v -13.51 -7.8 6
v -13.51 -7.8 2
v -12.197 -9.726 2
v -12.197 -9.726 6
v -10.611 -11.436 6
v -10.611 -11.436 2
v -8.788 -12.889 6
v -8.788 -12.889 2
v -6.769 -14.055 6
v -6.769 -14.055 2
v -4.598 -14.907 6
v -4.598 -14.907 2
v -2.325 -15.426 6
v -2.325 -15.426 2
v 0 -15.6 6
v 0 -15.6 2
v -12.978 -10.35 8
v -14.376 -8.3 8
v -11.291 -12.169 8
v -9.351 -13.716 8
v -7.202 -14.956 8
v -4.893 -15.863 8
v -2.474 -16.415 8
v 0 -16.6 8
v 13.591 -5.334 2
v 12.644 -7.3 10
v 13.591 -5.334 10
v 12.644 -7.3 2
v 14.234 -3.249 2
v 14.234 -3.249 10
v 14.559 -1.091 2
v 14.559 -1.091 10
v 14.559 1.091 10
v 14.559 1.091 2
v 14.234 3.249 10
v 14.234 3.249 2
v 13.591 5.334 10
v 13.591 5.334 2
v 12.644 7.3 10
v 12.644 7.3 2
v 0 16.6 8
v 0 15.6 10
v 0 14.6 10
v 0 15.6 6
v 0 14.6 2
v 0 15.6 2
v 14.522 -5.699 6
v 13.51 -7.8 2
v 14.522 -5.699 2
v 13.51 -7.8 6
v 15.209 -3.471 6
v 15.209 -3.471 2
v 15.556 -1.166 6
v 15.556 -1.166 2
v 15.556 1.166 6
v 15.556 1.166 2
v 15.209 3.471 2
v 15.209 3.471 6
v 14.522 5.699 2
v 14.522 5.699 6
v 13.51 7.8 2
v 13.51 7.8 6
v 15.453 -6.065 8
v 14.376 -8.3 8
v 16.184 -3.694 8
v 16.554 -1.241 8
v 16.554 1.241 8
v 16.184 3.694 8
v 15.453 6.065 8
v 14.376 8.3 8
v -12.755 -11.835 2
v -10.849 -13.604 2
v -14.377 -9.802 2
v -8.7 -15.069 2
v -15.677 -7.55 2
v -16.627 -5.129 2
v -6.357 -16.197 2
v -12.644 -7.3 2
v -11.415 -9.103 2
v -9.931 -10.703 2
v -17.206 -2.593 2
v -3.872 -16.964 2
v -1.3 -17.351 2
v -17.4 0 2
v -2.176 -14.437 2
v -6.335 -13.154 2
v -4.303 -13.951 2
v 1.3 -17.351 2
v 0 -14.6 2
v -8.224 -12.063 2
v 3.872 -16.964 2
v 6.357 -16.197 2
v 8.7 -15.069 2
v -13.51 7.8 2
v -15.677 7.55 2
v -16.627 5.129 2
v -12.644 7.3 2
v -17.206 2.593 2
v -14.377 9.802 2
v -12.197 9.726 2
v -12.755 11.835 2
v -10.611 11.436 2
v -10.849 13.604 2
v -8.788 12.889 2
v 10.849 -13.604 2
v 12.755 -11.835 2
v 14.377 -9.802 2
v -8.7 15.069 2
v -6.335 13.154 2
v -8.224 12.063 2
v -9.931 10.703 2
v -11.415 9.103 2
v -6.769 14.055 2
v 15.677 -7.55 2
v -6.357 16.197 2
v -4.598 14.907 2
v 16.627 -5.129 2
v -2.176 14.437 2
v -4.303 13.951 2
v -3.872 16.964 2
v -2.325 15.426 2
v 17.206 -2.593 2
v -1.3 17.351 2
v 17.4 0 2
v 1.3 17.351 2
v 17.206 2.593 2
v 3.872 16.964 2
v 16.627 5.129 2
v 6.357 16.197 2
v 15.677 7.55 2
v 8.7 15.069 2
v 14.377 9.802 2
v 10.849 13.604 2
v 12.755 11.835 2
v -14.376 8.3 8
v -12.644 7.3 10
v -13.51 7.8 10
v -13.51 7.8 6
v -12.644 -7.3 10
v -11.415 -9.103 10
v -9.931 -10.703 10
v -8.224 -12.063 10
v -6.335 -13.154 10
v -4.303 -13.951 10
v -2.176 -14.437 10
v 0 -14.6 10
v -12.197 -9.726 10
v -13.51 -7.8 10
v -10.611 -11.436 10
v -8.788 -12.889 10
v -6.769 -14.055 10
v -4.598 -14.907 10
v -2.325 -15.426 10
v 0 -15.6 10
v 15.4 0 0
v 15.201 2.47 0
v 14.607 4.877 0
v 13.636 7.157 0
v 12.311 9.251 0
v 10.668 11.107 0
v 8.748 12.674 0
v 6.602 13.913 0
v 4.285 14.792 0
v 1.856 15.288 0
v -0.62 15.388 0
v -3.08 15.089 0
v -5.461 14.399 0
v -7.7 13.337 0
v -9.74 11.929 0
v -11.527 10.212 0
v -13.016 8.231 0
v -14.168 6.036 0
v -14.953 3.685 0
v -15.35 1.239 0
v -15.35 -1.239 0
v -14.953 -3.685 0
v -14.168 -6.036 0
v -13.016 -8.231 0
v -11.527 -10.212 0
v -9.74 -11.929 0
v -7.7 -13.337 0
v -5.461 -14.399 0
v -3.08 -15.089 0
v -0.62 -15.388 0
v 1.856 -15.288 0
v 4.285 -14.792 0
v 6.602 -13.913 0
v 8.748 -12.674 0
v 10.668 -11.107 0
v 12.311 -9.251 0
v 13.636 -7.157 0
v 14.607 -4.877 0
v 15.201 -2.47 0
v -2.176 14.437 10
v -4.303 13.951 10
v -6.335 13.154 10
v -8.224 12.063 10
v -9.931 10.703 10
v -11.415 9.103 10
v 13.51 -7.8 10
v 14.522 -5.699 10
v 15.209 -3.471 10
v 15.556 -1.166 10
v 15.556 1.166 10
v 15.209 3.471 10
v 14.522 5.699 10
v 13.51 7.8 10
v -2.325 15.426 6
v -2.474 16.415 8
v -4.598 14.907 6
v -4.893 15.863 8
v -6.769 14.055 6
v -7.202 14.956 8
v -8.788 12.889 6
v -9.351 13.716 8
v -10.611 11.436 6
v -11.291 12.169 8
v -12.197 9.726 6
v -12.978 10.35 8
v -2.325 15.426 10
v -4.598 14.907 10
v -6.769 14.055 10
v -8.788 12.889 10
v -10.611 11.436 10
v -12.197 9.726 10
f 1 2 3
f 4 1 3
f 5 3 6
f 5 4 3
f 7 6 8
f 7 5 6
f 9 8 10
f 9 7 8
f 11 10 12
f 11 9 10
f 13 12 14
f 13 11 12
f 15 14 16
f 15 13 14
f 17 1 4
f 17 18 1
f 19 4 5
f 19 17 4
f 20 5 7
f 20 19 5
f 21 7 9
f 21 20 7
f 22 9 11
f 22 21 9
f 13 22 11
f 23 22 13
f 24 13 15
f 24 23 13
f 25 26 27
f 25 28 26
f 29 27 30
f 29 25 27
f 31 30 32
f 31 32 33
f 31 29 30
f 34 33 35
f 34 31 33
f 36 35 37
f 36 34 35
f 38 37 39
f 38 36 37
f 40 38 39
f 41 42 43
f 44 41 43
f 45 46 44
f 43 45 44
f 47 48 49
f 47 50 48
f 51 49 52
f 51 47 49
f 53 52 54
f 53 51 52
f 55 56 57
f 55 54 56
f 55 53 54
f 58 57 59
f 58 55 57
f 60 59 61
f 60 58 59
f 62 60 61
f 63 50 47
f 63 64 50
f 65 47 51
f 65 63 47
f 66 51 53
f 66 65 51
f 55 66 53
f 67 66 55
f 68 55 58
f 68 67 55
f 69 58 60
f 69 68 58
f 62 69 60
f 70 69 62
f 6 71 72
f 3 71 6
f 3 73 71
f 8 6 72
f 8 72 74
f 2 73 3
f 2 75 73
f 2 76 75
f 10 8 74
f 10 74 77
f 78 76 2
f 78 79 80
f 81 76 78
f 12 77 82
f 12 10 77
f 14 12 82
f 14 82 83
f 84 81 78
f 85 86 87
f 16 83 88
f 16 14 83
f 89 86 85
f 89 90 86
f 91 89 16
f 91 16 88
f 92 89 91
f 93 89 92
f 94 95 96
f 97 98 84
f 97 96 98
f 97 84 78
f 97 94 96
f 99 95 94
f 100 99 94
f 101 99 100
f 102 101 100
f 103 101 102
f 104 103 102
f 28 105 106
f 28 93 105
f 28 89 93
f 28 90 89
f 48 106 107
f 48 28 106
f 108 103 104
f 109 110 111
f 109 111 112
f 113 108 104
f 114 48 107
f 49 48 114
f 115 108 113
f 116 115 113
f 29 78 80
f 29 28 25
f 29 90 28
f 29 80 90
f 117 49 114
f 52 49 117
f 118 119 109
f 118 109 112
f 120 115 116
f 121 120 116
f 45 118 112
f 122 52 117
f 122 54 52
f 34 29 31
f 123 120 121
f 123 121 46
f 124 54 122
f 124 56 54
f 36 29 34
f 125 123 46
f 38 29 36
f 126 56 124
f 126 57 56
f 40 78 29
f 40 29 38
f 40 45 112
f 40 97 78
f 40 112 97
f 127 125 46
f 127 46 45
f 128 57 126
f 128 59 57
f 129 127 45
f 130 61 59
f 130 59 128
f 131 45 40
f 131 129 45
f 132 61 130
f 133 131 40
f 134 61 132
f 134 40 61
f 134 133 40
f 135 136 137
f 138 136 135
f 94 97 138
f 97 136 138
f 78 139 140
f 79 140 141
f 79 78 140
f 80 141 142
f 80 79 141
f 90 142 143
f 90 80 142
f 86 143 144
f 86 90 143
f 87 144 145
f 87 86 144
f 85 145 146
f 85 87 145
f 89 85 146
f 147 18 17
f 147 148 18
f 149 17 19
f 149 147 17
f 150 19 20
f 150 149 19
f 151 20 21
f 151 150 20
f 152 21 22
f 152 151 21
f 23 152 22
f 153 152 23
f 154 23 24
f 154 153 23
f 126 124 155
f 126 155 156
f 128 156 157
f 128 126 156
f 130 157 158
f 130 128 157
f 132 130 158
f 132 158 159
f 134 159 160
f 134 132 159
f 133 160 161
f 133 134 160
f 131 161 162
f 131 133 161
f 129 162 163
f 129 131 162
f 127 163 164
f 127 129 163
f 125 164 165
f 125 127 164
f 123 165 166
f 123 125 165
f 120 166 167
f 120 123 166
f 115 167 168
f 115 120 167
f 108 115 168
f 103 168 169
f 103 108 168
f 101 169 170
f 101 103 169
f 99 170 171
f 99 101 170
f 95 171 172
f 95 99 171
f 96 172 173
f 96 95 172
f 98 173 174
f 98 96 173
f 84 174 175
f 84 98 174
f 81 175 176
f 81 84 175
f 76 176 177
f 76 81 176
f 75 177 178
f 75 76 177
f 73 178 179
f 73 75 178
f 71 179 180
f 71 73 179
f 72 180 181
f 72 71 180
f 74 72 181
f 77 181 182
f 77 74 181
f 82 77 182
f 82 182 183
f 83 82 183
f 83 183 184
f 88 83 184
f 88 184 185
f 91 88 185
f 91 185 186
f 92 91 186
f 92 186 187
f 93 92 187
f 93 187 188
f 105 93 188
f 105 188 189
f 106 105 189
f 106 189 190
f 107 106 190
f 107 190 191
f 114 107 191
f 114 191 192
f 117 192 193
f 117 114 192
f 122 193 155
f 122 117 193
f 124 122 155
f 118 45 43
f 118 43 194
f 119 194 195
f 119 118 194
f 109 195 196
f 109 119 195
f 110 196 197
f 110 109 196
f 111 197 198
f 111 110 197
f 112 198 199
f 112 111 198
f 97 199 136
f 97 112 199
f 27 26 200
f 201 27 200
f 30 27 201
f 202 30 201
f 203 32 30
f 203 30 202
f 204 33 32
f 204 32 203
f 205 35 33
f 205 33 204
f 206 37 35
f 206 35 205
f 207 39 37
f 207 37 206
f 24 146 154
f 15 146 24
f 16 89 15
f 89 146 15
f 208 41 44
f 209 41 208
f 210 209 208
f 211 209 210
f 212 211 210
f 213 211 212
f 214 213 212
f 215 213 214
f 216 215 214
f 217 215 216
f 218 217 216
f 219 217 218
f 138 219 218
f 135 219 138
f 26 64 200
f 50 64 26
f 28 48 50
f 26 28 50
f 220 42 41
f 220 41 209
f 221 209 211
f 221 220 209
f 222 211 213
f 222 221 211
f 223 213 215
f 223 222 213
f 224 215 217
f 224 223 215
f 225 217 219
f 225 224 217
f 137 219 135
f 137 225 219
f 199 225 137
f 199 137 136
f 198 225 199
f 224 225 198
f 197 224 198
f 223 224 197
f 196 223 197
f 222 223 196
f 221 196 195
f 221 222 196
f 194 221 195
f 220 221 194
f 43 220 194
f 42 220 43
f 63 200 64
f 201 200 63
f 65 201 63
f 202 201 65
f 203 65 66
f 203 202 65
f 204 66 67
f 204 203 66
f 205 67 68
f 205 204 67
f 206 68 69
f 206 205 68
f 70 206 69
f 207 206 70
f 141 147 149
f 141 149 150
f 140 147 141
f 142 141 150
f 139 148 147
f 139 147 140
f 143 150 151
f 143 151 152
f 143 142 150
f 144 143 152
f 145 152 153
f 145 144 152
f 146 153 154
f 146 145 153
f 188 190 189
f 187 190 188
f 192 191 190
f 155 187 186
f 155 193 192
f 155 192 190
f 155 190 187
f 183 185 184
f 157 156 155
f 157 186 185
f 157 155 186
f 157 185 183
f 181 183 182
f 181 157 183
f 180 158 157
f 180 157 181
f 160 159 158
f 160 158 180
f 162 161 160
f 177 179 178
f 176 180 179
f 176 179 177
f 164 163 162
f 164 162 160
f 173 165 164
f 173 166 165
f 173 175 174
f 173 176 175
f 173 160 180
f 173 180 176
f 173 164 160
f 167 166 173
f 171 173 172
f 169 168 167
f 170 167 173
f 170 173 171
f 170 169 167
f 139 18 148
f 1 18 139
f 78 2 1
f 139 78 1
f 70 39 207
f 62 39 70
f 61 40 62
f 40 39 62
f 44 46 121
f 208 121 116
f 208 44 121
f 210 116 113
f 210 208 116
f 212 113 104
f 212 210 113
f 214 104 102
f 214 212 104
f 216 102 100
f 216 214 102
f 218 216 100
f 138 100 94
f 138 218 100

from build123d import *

# Parameters (mm, degrees)
F3_DEPTH = 8.001


with BuildPart() as f1:
    # F0 (on Front) → F1 (revolve)
    with BuildSketch(Plane.XZ):
        Polygon((0, 2), (0, 0), (15.4, 0), (15.4, 2), (14.6, 2), align=None)
        Polygon((15.4, 2), (15.4, 0), (17.4, 2), (15.6, 2), align=None)
        Polygon((14.6, 2), (15.4, 2), (15.6, 2), (15.6, 6), (15.6, 10), (14.6, 10), align=None)
        Polygon((15.6, 10), (15.6, 6), (16.6, 8), align=None)
    revolve(axis=Axis((0, 0, 1), (0, 0, 1)))

    # F2 (on face) → F3 (cut, through all)
    with BuildSketch(Plane.XY.offset(2)):
        with BuildLine():
            Line((0, 19), (0, 0))
            Line((0, 0), (16.454483, 9.5))
            ThreePointArc((16.454483, 9.5), (9.5, 16.454483), (0, 19))
        make_face()
        with BuildLine():
            Line((-16.454483, -9.5), (0, 0))
            Line((0, 0), (-16.454483, 9.5))
            ThreePointArc((-16.454483, 9.5), (-19, 0), (-16.454483, -9.5))
        make_face()
        with BuildLine():
            Line((16.454483, -9.5), (0, 0))
            Line((0, 0), (0, -19))
            ThreePointArc((0, -19), (9.5, -16.454483), (16.454483, -9.5))
        make_face()
    extrude(amount=F3_DEPTH, mode=Mode.SUBTRACT)


solid = f1.part
